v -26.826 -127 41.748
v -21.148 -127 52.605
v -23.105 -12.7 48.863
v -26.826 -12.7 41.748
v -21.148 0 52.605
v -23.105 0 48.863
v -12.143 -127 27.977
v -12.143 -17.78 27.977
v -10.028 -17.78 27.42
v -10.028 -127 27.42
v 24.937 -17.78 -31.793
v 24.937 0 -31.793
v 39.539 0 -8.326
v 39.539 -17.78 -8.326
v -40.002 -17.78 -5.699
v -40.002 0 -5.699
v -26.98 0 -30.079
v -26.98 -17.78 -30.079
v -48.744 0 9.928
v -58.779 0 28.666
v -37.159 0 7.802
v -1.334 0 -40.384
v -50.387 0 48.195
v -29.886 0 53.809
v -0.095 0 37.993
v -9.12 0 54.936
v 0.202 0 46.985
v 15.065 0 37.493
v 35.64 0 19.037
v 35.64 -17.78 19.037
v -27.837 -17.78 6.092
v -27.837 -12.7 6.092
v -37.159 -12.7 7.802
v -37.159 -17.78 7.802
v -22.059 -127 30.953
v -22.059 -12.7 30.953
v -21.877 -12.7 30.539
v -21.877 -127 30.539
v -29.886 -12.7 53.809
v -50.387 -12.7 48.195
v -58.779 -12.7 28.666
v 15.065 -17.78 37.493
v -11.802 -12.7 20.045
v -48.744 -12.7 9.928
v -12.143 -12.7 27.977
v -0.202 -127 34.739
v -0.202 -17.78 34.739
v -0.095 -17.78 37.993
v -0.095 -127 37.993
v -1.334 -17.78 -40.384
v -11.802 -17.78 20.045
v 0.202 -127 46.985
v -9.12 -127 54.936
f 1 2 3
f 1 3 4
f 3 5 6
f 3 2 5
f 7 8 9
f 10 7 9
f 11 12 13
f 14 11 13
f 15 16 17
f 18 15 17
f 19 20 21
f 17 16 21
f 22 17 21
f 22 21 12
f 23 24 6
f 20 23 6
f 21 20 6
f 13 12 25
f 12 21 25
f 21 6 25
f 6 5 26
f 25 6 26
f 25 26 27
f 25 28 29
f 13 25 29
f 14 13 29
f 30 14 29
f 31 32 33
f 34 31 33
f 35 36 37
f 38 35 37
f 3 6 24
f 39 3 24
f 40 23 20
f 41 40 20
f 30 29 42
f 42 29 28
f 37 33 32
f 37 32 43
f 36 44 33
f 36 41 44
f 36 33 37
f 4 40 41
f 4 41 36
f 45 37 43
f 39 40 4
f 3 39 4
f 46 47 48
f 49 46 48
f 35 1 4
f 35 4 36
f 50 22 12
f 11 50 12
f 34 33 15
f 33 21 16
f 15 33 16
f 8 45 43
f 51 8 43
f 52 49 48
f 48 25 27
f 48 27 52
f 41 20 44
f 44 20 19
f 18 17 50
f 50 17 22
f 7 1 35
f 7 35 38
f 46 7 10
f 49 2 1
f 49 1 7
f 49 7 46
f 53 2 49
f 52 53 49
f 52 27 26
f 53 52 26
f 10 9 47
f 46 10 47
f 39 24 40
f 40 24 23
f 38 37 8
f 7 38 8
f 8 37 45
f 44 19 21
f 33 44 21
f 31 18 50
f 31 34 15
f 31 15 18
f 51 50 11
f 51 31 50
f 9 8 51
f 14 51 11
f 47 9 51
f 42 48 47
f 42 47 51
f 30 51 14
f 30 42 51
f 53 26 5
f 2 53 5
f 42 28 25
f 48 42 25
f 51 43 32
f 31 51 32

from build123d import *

# Parameters (mm, degrees)
F1_DEPTH = 17.78
F2_DEPTH = 12.7
F3_DEPTH = 127
F4_DEPTH = 50.8


with BuildPart() as f1:
    # F0 (on Front) → F1 (new body)
    with BuildSketch(Plane.XZ):
        Polygon((-26.9799930214, -30.0789192878), (-1.3335170985, -40.384194199), (24.9369262952, -31.7932558242), (39.5391047323, -8.3258997066), (35.640496637, 19.0372374158), (15.0653040652, 37.492639576), (-0.0947250793, 37.9932353779), (-0.2021778175, 34.7391396875), (-10.0282026626, 27.4203366243), (-12.1426928308, 27.9769725351), (-11.8020968639, 20.0453100056), (-27.8368135787, 6.0916620046), (-37.1591211673, 7.8023393187), (-40.0022303604, -5.6993837518), align=None)
    extrude(amount=F1_DEPTH)

    # F0 (on Front) → F2 (join)
    with BuildSketch(Plane.XZ):
        Polygon((-48.7436972284, 9.9281511173), (-37.1591211673, 7.8023393187), (-34.3069795385, 21.3469567832), (-22.0594268614, 30.9532808442), (-26.8255087596, 41.7476859043), (-23.1050903168, 48.862511609), (-29.8858768711, 53.8094276768), (-50.3869184057, 48.1948280781), (-58.7794380023, 28.6658227916), align=None)
        Polygon((-34.3069795385, 21.3469567832), (-37.1591211673, 7.8023393187), (-27.8368135787, 6.0916620046), (-11.8020968639, 20.0453100056), (-12.1426928308, 27.9769725351), (-21.8766995951, 30.539433124), (-22.0594268614, 30.9532808442), align=None)
    extrude(amount=F2_DEPTH)

    # F0 (on Front) → F3 (join)
    with BuildSketch(Plane.XZ):
        Polygon((-12.5591117109, 38.4048189943), (-0.0947250793, 37.9932353779), (0.2021778175, 46.9846343306), (-9.1196237983, 54.9357133249), (-21.1480759179, 52.6050520151), (-23.1050903168, 48.862511609), (-12.7140158191, 41.2817135729), (-12.589456174, 38.3810184234), align=None)
        Polygon((-0.2021778175, 34.7391396875), (-0.0947250793, 37.9932353779), (-12.5591117109, 38.4048189943), (-12.589456174, 38.3810184234), (-12.1426928308, 27.9769725351), (-10.0282026626, 27.4203366243), align=None)
        Polygon((-26.8255087596, 41.7476859043), (-22.0594268614, 30.9532808442), (-12.589456174, 38.3810184234), (-12.7140158191, 41.2817135729), (-23.1050903168, 48.862511609), align=None)
        Polygon((-12.589456174, 38.3810184234), (-22.0594268614, 30.9532808442), (-21.8766995951, 30.539433124), (-12.1426928308, 27.9769725351), align=None)
    extrude(amount=F3_DEPTH)

    # F0 (on Front) → F4 (cut)
    with BuildSketch(Plane.XZ):
        Polygon((-26.8255087596, 41.7476859043), (-22.0594268614, 30.9532808442), (-12.589456174, 38.3810184234), (-12.7140158191, 41.2817135729), (-23.1050903168, 48.862511609), align=None)
        Polygon((-12.5591117109, 38.4048189943), (-0.0947250793, 37.9932353779), (0.2021778175, 46.9846343306), (-9.1196237983, 54.9357133249), (-21.1480759179, 52.6050520151), (-23.1050903168, 48.862511609), (-12.7140158191, 41.2817135729), (-12.589456174, 38.3810184234), align=None)
        Polygon((-0.2021778175, 34.7391396875), (-0.0947250793, 37.9932353779), (-12.5591117109, 38.4048189943), (-12.589456174, 38.3810184234), (-12.1426928308, 27.9769725351), (-10.0282026626, 27.4203366243), align=None)
        Polygon((-12.589456174, 38.3810184234), (-22.0594268614, 30.9532808442), (-21.8766995951, 30.539433124), (-12.1426928308, 27.9769725351), align=None)
    extrude(amount=-F4_DEPTH, mode=Mode.SUBTRACT)


solid = f1.part
